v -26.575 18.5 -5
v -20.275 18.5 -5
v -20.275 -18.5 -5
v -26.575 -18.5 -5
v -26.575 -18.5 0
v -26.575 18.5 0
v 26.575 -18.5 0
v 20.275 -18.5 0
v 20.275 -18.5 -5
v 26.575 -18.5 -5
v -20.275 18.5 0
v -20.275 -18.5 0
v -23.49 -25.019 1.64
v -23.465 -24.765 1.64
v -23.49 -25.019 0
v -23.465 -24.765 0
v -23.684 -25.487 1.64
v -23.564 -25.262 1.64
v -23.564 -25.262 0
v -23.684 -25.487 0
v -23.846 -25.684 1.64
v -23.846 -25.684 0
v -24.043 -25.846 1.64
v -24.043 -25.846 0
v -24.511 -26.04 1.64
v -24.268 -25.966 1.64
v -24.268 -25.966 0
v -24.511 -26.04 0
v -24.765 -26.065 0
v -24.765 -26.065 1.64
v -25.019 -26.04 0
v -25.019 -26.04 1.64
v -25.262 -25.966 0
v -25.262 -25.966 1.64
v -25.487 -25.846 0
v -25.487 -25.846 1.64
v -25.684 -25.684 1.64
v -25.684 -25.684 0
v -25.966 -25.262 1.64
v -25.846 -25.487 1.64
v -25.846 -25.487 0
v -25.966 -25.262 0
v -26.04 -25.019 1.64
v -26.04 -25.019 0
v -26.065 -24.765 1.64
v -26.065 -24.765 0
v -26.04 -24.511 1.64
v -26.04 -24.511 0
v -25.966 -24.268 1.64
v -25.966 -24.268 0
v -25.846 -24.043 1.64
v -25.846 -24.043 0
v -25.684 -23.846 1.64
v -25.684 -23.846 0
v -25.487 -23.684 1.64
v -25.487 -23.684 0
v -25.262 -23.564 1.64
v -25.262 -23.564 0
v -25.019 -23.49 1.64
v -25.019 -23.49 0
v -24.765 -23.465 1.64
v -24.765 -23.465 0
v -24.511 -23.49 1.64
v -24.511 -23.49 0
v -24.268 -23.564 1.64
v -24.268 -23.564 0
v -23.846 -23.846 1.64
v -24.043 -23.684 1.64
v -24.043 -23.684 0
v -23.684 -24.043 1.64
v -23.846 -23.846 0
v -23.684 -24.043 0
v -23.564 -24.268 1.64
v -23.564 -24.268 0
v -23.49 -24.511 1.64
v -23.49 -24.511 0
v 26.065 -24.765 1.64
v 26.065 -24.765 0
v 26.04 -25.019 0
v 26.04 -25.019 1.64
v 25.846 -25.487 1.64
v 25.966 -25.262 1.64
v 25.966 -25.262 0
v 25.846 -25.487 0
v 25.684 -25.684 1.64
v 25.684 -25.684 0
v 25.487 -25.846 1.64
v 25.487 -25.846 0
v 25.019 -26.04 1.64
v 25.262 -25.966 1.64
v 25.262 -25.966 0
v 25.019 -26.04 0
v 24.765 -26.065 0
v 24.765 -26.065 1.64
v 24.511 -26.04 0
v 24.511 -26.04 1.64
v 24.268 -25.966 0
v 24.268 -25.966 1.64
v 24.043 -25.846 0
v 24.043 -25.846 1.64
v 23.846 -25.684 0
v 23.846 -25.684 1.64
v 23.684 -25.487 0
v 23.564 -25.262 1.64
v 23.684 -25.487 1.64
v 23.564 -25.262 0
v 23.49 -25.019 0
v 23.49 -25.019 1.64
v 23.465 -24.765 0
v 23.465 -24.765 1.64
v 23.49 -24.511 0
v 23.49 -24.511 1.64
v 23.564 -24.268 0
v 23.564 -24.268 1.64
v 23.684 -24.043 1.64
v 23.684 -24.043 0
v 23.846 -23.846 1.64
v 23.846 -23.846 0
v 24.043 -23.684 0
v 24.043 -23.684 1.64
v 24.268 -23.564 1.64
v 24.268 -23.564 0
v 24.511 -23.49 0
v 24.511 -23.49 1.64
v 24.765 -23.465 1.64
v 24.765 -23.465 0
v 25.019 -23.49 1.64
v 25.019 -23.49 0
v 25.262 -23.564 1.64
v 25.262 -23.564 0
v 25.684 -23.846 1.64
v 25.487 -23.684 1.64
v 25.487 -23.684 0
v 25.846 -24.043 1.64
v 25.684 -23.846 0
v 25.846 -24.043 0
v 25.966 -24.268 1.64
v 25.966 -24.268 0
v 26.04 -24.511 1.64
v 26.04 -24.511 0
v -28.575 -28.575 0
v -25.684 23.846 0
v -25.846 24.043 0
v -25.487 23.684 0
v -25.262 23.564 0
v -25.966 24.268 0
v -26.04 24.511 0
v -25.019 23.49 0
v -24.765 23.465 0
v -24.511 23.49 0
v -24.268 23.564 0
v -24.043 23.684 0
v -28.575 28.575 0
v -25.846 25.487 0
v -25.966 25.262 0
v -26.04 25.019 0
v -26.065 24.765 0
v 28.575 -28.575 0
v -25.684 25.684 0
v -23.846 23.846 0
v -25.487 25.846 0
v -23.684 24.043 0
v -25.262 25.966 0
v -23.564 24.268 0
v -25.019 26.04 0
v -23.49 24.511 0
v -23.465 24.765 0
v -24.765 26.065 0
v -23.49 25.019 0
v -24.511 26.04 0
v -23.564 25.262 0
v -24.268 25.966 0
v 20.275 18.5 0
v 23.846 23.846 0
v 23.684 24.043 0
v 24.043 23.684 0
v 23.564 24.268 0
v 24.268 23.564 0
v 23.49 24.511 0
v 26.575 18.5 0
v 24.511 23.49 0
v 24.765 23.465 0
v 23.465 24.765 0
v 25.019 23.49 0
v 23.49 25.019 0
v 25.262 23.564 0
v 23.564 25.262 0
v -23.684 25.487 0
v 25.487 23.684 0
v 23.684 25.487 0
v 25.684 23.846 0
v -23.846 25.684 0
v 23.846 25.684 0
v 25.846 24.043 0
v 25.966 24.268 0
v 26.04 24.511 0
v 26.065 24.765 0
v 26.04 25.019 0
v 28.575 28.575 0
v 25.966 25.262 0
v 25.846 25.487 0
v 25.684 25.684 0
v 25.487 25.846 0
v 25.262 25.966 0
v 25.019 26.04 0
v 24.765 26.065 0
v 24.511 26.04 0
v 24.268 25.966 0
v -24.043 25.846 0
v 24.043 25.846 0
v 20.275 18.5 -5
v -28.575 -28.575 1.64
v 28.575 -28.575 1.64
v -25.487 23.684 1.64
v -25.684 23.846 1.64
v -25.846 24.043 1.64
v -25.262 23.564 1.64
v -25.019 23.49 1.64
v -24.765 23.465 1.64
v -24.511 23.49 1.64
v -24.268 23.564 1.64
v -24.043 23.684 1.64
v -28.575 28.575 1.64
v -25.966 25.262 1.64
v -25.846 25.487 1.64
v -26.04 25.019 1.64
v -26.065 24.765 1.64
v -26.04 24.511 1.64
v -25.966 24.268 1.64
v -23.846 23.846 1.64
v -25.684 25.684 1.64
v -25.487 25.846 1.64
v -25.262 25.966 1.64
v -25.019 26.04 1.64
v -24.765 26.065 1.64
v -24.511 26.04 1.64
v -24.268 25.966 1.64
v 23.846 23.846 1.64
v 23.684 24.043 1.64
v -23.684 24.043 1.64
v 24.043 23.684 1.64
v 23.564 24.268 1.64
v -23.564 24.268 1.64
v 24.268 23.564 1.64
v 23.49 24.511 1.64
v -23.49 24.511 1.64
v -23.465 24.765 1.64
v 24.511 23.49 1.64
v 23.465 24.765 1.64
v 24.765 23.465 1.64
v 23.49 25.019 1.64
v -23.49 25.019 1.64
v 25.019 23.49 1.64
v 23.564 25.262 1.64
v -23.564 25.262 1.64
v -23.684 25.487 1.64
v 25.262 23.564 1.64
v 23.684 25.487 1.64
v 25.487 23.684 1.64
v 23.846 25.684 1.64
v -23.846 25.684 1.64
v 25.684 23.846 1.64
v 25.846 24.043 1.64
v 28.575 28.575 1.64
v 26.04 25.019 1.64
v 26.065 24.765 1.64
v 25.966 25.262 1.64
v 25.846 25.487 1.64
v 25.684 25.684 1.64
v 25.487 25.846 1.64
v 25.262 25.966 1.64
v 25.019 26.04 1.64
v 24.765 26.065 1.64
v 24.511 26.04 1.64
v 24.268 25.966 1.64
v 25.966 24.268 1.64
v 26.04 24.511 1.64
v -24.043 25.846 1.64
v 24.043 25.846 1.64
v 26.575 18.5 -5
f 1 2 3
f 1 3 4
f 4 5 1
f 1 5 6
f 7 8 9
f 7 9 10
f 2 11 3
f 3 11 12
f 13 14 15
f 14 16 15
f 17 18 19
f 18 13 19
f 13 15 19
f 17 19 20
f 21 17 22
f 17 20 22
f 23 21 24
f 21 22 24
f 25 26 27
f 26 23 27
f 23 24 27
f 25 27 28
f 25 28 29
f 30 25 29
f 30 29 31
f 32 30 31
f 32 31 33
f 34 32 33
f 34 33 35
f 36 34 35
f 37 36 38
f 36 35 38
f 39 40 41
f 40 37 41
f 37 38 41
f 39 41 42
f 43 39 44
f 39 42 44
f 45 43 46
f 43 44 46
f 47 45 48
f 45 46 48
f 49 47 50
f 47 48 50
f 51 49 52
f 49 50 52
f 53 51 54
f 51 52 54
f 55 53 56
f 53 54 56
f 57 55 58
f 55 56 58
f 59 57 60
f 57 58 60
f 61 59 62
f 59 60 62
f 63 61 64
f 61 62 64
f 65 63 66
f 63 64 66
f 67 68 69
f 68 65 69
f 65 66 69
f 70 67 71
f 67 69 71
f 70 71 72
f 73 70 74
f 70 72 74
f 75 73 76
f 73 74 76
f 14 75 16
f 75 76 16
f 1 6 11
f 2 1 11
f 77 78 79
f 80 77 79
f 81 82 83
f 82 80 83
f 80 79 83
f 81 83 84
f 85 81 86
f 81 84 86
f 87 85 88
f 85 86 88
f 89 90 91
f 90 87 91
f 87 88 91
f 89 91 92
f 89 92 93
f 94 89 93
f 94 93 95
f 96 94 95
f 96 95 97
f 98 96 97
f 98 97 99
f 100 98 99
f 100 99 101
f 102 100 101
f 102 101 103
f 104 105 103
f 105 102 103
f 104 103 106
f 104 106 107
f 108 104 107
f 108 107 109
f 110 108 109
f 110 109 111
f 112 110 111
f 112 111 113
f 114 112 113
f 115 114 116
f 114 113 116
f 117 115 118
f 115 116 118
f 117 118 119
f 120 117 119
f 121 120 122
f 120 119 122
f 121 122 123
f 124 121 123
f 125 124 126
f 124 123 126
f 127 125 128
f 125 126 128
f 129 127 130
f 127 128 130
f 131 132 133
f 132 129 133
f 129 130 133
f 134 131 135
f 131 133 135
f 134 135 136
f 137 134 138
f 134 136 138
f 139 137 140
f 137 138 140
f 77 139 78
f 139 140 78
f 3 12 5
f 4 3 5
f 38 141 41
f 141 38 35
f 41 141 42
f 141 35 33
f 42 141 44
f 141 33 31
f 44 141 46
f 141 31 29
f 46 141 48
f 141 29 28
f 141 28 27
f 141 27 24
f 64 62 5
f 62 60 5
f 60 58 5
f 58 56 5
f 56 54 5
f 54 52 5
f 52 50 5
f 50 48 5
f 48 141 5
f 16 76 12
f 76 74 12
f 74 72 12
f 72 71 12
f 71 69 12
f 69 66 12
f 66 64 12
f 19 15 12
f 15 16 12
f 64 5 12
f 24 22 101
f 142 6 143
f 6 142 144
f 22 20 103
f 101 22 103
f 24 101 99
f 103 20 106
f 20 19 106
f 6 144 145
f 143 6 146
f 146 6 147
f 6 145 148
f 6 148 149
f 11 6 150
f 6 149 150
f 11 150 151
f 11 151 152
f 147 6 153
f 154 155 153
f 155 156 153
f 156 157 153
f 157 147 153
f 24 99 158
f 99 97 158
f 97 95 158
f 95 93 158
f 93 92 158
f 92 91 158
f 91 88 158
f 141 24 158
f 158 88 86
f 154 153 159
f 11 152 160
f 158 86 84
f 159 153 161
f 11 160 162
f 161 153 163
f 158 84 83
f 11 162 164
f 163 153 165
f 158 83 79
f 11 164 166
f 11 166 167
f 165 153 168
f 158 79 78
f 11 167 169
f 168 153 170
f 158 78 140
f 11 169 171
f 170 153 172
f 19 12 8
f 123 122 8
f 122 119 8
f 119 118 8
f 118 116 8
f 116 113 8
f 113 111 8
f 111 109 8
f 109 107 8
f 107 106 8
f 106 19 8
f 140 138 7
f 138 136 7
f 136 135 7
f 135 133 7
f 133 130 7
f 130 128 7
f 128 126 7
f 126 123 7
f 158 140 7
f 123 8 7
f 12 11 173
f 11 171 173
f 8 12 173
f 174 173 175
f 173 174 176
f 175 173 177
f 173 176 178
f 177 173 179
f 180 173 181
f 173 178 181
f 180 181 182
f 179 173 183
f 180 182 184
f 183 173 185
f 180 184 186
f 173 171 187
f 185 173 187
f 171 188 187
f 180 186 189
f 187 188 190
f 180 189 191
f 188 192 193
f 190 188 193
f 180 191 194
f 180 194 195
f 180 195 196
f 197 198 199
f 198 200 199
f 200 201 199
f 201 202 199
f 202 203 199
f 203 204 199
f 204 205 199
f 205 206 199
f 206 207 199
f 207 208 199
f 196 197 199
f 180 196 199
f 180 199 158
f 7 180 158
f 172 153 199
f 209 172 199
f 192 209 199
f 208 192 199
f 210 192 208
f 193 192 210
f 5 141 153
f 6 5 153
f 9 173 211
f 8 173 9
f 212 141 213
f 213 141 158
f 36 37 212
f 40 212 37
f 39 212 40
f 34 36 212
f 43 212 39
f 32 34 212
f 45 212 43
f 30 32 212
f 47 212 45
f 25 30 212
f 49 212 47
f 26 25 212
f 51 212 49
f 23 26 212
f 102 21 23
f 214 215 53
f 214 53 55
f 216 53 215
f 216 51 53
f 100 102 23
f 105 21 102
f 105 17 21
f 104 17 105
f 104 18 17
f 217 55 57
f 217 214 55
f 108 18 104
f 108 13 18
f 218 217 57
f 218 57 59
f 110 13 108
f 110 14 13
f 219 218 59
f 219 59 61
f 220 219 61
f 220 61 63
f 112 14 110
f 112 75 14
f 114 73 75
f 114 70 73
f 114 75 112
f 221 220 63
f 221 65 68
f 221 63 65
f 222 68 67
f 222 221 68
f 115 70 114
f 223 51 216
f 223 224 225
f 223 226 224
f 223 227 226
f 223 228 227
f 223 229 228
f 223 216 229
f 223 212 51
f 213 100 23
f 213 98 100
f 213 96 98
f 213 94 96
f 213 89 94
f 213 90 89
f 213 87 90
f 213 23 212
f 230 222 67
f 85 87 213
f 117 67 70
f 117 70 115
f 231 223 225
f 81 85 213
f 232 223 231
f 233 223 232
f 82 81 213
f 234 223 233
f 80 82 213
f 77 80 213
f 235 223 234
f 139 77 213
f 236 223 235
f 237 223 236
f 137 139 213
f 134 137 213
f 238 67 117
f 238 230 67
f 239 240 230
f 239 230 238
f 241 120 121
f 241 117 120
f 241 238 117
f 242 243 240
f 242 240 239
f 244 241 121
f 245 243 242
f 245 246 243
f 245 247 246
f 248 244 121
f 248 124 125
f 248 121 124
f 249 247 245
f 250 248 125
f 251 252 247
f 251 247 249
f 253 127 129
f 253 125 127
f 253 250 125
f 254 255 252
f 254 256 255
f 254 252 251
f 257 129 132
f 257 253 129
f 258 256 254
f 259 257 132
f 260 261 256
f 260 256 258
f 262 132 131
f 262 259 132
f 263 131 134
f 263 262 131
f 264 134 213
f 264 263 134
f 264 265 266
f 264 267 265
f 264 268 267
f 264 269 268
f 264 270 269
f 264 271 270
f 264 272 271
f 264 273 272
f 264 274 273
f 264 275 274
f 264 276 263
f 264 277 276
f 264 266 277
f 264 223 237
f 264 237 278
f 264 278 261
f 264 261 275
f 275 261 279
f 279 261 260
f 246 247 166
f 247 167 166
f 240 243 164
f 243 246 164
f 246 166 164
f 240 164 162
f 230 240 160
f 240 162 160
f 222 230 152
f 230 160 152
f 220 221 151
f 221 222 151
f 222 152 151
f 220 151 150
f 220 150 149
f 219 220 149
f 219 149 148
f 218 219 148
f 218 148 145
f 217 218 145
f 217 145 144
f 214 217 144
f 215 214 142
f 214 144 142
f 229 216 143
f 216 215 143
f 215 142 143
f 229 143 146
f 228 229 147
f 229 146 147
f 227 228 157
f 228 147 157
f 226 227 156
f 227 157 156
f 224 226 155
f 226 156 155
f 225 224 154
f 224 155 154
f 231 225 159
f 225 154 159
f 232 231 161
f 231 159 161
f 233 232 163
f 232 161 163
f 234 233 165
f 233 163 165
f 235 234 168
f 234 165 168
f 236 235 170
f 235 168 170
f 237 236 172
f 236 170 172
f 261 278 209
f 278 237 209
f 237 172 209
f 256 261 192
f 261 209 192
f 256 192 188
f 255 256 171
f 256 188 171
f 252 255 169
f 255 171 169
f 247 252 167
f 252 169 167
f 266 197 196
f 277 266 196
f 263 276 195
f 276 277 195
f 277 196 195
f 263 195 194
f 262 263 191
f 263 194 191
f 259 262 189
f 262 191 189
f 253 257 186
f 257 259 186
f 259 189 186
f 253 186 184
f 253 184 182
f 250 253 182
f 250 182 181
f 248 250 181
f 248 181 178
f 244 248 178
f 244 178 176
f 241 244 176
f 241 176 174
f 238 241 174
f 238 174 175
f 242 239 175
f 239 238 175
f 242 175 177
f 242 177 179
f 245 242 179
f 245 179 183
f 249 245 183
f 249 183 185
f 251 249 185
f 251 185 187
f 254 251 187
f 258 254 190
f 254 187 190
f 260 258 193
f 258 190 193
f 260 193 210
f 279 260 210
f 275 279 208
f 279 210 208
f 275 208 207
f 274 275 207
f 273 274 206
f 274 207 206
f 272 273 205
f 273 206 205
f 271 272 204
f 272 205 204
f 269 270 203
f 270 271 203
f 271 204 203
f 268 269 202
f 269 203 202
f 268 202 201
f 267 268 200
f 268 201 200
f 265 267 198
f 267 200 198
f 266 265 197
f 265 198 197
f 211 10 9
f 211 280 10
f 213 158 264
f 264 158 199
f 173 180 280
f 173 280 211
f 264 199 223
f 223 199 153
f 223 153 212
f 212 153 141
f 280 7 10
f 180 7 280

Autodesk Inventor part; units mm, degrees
ref_plane "YZ Plane" through (0, 0, 0) normal (1, 0, 0) x (0, 1, 0)
ref_plane "XZ Plane" through (0, 0, 0) normal (0, 1, 0) x (-1, 0, 0)
ref_plane "XY Plane" through (0, 0, 0) normal (0, 0, 1) x (1, 0, 0)
sketch "Sketch1" plane through (0, 0, 0) normal (0, 0, 1) x (1, 0, 0)
  line L0 (-28.575, -28.575) -> (28.575, -28.575)
  line L1 (28.575, -28.575) -> (28.575, 28.575)
  line L2 (28.575, 28.575) -> (-28.575, 28.575)
  line L3 (-28.575, 28.575) -> (-28.575, -28.575)
  line L4 (-28.575, -28.575) -> (28.575, 28.575) construction
  line L5 (28.575, -28.575) -> (-28.575, 28.575) construction
  line L6 (-28.575, 0) -> (28.575, 0) construction
  line L7 (0, 28.575) -> (0, -28.575) construction
  circle A0 centre (-24.765, 24.765) radius 1.3
  circle A1 centre (24.765, 24.765) radius 1.3
  circle A2 centre (-24.765, -24.765) radius 1.3
  circle A3 centre (24.765, -24.765) radius 1.3
  point P0 (0, 0)
  dimension "d2" = 57.15
  dimension "d4" = 57.15
  dimension "d26" = 2.6
  dimension "d27" = 3.81
extrude "Extrusion1" add sketch "Sketch1" along normal blind 1.64
sketch "Sketch4" plane through (0, 0, 0) normal (0, 0, -1) x (-1, 0, 0)
  line L0 (-28.575, -28.575) -> (28.575, -28.575)
  line L1 (-28.575, 28.575) -> (-28.575, -28.575)
  line L2 (-26.575, 18.5) -> (-20.275, 18.5)
  line L3 (-20.275, 18.5) -> (-20.275, -18.5)
  line L4 (-20.275, -18.5) -> (-26.575, -18.5)
  line L5 (-26.575, -18.5) -> (-26.575, 18.5)
  line L6 (-20.275, 18.5) -> (-26.575, -18.5) construction
  line L7 (-26.575, 18.5) -> (-20.275, -18.5) construction
  line L8 (0, 0) -> (-28.575, 0) construction
  line L9 (0, -28.575) -> (0, 0) construction
  line L10 (26.575, 18.5) -> (20.275, 18.5)
  line L11 (20.275, 18.5) -> (20.275, -18.5)
  line L12 (20.275, -18.5) -> (26.575, -18.5)
  line L13 (26.575, -18.5) -> (26.575, 18.5)
  line L14 (28.575, -28.575) -> (-28.575, -28.575) projected
  line L15 (28.575, 28.575) -> (28.575, -28.575) projected
  line L16 (-28.575, 28.575) -> (28.575, 28.575) projected
  line L17 (-28.575, -28.575) -> (-28.575, 28.575) projected
  point P0 (-23.425, 0)
  dimension "d21" = 37
  dimension "d22" = 6.3
  dimension "d23" = 2
extrude "Extrusion4" add sketch "Sketch4" along normal blind 5 contours L2 L3 L4 L5 | L13 L12 L11 L10
properties part number "SFE-ProcessingBoard01" material "PCB(1)"
